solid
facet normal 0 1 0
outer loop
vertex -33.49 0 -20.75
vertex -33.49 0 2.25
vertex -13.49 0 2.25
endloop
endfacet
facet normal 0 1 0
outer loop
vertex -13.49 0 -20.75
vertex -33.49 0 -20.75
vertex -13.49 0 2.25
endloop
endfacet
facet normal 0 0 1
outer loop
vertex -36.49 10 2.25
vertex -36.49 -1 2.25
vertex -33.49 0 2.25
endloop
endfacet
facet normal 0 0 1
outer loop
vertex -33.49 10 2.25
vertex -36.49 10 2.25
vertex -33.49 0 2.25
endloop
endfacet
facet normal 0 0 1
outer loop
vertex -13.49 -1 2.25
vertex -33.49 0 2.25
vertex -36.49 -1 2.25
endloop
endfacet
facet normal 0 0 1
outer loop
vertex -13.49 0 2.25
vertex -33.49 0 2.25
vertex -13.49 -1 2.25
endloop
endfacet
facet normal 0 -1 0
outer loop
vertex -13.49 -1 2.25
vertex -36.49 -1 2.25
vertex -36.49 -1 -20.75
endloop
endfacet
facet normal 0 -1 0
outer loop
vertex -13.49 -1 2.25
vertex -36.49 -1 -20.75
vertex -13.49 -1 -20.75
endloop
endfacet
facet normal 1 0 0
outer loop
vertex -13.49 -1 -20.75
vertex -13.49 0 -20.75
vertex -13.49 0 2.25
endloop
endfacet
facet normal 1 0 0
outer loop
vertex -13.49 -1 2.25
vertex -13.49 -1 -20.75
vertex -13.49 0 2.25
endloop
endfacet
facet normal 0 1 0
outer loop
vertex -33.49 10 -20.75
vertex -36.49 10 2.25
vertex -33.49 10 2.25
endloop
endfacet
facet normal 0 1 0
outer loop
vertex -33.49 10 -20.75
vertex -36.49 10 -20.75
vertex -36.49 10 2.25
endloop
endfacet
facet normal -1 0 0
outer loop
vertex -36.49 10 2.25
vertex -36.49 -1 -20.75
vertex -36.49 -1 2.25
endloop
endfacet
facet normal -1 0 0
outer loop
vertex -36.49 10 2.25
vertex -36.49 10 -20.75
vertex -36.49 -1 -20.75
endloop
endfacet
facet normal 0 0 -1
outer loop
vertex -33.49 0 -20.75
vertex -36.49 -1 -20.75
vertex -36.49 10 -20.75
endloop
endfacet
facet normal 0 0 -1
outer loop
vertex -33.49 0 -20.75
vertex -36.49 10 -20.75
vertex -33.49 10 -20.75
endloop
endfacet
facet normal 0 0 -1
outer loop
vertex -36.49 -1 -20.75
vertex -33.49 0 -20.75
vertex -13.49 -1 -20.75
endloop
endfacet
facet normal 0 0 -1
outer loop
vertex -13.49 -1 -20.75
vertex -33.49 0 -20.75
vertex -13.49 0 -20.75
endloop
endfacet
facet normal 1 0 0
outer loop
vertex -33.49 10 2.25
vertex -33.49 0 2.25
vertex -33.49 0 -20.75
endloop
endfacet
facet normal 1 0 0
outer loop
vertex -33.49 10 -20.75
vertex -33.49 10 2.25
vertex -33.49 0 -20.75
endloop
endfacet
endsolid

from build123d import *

# Parameters (mm, degrees)
BOSS_EXTRUDE1_DEPTH = 10
SKETCH2_W           = 23
SKETCH2_H           = 23
BOSS_EXTRUDE2_DEPTH = 1


with BuildPart() as part:
    # Sketch1 → Boss-Extrude1 (new body)
    with BuildSketch(Plane(origin=(0, 0, 0), x_dir=(1, 0, 0), z_dir=(0, 1, 0))):
        Polygon((-36.489872914, 17.750117647), (-36.489872914, -2.249882353), (-33.489872914, -2.249882353), (-33.489872914, 0.750117647), (-33.489872914, 20.750117647), (-36.489872914, 20.750117647), align=None)
    extrude(amount=BOSS_EXTRUDE1_DEPTH)

    # Sketch2 → Boss-Extrude2 (add)
    with BuildSketch(Plane.XZ):
        with Locations((-24.989872914, -9.250117647)):
            Rectangle(SKETCH2_W, SKETCH2_H)
    extrude(amount=BOSS_EXTRUDE2_DEPTH)


solid = part.part
